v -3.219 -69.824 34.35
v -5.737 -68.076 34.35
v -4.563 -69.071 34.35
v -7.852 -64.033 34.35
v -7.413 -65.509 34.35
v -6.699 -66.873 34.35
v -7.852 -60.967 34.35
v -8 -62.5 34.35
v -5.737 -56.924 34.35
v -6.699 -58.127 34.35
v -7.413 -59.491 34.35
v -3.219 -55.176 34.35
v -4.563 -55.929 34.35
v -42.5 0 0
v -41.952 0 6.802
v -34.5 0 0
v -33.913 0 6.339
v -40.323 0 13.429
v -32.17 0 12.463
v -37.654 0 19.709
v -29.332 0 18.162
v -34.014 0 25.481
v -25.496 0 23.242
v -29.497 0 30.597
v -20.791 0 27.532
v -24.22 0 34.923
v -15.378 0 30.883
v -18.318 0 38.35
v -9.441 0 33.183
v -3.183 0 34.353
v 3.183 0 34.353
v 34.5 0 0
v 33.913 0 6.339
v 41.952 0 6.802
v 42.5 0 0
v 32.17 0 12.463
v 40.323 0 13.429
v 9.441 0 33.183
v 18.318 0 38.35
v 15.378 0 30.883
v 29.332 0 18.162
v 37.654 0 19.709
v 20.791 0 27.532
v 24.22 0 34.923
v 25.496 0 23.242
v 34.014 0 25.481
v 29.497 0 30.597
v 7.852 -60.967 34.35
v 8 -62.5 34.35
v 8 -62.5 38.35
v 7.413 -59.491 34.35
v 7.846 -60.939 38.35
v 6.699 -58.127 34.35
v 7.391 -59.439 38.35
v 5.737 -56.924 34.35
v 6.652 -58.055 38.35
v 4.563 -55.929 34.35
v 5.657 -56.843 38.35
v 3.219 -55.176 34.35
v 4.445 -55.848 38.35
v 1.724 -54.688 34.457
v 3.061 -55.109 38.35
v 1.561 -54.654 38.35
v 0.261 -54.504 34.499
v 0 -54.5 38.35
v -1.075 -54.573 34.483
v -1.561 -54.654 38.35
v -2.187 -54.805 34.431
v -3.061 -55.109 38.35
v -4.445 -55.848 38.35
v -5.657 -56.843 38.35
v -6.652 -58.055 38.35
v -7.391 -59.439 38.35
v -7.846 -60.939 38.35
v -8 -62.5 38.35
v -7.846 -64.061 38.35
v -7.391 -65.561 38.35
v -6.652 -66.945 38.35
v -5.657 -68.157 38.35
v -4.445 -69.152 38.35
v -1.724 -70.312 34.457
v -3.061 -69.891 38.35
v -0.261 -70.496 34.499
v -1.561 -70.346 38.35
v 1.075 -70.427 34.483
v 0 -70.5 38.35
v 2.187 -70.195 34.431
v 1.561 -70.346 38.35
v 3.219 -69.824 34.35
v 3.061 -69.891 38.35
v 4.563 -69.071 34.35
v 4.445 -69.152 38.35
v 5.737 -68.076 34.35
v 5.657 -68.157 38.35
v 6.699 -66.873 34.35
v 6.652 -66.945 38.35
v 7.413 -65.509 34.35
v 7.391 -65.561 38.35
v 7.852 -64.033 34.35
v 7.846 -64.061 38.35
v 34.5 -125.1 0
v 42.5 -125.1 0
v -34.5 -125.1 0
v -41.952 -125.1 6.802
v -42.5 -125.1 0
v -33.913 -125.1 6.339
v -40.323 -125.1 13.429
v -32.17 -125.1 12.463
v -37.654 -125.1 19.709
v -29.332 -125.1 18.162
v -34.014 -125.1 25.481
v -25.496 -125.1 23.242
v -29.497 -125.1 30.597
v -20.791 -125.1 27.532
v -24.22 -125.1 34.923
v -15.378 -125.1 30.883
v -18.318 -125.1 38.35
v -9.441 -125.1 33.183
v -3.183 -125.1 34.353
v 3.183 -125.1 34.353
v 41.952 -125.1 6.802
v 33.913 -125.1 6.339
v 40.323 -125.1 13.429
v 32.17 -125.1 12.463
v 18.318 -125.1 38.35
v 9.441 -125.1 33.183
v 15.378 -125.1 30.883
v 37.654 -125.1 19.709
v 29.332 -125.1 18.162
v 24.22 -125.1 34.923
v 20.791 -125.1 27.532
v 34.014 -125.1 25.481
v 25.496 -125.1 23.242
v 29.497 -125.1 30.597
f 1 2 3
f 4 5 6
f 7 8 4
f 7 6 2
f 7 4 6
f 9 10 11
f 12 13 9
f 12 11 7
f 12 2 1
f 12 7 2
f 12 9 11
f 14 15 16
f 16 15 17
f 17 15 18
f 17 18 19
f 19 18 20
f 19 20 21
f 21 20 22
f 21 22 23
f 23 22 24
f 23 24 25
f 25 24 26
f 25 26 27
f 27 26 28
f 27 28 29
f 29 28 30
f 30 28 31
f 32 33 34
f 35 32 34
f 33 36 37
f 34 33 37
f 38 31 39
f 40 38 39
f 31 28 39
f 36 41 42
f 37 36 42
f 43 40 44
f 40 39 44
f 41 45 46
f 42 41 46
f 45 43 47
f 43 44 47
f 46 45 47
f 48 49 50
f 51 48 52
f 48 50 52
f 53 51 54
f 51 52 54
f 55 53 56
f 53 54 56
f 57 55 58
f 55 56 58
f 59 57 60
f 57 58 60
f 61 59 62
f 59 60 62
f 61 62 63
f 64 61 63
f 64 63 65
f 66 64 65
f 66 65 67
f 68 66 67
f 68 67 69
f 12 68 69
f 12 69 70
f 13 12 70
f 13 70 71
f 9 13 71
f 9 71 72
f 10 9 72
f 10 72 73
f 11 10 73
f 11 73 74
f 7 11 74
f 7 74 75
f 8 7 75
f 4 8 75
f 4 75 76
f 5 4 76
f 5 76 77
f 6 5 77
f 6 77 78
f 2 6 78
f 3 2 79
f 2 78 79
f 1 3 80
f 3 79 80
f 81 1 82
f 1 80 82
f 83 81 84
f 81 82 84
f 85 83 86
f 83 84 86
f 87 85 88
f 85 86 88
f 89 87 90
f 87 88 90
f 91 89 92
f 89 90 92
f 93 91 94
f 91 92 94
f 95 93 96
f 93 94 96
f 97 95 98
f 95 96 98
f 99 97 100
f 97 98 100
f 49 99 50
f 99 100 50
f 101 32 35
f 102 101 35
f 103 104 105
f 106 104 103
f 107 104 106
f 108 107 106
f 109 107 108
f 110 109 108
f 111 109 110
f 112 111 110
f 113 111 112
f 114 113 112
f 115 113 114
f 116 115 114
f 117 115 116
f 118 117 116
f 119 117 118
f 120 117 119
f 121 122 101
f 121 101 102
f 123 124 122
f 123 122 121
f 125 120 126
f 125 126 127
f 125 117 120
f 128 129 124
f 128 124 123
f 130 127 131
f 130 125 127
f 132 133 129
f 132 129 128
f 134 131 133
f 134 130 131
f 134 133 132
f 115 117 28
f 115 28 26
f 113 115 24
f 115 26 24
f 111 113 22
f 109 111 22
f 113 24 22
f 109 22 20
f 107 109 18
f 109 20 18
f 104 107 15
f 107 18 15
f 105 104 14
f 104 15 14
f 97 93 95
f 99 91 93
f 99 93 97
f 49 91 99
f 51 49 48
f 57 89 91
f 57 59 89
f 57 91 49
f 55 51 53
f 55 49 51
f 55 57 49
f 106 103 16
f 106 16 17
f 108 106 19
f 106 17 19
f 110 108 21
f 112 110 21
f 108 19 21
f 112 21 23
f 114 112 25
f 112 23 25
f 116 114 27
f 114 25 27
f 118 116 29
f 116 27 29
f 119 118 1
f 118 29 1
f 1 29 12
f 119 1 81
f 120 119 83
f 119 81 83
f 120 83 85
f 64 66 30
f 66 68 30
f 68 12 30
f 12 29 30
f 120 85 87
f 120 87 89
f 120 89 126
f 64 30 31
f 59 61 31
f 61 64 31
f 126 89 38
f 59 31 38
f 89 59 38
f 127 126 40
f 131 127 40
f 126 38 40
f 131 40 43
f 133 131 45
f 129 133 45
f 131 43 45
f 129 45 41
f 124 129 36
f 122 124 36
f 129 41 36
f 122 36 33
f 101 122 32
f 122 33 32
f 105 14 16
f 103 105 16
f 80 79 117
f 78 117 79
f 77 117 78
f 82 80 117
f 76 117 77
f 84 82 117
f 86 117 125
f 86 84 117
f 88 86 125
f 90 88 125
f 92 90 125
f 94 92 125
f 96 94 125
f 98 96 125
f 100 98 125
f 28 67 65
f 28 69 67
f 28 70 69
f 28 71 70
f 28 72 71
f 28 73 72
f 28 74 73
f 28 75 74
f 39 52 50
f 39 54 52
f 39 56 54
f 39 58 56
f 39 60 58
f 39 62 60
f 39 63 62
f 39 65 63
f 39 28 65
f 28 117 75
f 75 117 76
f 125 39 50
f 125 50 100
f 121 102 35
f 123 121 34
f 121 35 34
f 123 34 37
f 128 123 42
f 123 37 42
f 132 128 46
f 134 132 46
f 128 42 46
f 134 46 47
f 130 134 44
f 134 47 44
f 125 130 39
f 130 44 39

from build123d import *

# Parameters (mm, degrees)
F1_DEPTH = 125.1
F2_W     = 44
F2_H     = 7.301
F3_DEPTH = 125.1
F4_R     = 8
F5_DEPTH = 4


with BuildPart() as f1:
    # F0 (on Front) → F1 (new body)
    with BuildSketch(Plane.XZ):
        with BuildLine():
            ThreePointArc((-34.5, 0), (0, 34.5), (34.5, 0))
            Line((34.5, 0), (42.5, 0))
            ThreePointArc((42.5, 0), (0, 42.5), (-42.5, 0))
            Line((-42.5, 0), (-34.5, 0))
        make_face()
    extrude(amount=F1_DEPTH)

    # F2 (on Front) → F3 (cut)
    with BuildSketch(Plane.XZ):
        with Locations((0, 42)):
            Rectangle(F2_W, F2_H)
    extrude(amount=F3_DEPTH, mode=Mode.SUBTRACT)

    # F4 (on face) → F5 (cut)
    with BuildSketch(Plane.XY.offset(38.3495)):
        with Locations((0, -62.5)):
            Circle(F4_R)
    extrude(amount=-F5_DEPTH, mode=Mode.SUBTRACT)


solid = f1.part
